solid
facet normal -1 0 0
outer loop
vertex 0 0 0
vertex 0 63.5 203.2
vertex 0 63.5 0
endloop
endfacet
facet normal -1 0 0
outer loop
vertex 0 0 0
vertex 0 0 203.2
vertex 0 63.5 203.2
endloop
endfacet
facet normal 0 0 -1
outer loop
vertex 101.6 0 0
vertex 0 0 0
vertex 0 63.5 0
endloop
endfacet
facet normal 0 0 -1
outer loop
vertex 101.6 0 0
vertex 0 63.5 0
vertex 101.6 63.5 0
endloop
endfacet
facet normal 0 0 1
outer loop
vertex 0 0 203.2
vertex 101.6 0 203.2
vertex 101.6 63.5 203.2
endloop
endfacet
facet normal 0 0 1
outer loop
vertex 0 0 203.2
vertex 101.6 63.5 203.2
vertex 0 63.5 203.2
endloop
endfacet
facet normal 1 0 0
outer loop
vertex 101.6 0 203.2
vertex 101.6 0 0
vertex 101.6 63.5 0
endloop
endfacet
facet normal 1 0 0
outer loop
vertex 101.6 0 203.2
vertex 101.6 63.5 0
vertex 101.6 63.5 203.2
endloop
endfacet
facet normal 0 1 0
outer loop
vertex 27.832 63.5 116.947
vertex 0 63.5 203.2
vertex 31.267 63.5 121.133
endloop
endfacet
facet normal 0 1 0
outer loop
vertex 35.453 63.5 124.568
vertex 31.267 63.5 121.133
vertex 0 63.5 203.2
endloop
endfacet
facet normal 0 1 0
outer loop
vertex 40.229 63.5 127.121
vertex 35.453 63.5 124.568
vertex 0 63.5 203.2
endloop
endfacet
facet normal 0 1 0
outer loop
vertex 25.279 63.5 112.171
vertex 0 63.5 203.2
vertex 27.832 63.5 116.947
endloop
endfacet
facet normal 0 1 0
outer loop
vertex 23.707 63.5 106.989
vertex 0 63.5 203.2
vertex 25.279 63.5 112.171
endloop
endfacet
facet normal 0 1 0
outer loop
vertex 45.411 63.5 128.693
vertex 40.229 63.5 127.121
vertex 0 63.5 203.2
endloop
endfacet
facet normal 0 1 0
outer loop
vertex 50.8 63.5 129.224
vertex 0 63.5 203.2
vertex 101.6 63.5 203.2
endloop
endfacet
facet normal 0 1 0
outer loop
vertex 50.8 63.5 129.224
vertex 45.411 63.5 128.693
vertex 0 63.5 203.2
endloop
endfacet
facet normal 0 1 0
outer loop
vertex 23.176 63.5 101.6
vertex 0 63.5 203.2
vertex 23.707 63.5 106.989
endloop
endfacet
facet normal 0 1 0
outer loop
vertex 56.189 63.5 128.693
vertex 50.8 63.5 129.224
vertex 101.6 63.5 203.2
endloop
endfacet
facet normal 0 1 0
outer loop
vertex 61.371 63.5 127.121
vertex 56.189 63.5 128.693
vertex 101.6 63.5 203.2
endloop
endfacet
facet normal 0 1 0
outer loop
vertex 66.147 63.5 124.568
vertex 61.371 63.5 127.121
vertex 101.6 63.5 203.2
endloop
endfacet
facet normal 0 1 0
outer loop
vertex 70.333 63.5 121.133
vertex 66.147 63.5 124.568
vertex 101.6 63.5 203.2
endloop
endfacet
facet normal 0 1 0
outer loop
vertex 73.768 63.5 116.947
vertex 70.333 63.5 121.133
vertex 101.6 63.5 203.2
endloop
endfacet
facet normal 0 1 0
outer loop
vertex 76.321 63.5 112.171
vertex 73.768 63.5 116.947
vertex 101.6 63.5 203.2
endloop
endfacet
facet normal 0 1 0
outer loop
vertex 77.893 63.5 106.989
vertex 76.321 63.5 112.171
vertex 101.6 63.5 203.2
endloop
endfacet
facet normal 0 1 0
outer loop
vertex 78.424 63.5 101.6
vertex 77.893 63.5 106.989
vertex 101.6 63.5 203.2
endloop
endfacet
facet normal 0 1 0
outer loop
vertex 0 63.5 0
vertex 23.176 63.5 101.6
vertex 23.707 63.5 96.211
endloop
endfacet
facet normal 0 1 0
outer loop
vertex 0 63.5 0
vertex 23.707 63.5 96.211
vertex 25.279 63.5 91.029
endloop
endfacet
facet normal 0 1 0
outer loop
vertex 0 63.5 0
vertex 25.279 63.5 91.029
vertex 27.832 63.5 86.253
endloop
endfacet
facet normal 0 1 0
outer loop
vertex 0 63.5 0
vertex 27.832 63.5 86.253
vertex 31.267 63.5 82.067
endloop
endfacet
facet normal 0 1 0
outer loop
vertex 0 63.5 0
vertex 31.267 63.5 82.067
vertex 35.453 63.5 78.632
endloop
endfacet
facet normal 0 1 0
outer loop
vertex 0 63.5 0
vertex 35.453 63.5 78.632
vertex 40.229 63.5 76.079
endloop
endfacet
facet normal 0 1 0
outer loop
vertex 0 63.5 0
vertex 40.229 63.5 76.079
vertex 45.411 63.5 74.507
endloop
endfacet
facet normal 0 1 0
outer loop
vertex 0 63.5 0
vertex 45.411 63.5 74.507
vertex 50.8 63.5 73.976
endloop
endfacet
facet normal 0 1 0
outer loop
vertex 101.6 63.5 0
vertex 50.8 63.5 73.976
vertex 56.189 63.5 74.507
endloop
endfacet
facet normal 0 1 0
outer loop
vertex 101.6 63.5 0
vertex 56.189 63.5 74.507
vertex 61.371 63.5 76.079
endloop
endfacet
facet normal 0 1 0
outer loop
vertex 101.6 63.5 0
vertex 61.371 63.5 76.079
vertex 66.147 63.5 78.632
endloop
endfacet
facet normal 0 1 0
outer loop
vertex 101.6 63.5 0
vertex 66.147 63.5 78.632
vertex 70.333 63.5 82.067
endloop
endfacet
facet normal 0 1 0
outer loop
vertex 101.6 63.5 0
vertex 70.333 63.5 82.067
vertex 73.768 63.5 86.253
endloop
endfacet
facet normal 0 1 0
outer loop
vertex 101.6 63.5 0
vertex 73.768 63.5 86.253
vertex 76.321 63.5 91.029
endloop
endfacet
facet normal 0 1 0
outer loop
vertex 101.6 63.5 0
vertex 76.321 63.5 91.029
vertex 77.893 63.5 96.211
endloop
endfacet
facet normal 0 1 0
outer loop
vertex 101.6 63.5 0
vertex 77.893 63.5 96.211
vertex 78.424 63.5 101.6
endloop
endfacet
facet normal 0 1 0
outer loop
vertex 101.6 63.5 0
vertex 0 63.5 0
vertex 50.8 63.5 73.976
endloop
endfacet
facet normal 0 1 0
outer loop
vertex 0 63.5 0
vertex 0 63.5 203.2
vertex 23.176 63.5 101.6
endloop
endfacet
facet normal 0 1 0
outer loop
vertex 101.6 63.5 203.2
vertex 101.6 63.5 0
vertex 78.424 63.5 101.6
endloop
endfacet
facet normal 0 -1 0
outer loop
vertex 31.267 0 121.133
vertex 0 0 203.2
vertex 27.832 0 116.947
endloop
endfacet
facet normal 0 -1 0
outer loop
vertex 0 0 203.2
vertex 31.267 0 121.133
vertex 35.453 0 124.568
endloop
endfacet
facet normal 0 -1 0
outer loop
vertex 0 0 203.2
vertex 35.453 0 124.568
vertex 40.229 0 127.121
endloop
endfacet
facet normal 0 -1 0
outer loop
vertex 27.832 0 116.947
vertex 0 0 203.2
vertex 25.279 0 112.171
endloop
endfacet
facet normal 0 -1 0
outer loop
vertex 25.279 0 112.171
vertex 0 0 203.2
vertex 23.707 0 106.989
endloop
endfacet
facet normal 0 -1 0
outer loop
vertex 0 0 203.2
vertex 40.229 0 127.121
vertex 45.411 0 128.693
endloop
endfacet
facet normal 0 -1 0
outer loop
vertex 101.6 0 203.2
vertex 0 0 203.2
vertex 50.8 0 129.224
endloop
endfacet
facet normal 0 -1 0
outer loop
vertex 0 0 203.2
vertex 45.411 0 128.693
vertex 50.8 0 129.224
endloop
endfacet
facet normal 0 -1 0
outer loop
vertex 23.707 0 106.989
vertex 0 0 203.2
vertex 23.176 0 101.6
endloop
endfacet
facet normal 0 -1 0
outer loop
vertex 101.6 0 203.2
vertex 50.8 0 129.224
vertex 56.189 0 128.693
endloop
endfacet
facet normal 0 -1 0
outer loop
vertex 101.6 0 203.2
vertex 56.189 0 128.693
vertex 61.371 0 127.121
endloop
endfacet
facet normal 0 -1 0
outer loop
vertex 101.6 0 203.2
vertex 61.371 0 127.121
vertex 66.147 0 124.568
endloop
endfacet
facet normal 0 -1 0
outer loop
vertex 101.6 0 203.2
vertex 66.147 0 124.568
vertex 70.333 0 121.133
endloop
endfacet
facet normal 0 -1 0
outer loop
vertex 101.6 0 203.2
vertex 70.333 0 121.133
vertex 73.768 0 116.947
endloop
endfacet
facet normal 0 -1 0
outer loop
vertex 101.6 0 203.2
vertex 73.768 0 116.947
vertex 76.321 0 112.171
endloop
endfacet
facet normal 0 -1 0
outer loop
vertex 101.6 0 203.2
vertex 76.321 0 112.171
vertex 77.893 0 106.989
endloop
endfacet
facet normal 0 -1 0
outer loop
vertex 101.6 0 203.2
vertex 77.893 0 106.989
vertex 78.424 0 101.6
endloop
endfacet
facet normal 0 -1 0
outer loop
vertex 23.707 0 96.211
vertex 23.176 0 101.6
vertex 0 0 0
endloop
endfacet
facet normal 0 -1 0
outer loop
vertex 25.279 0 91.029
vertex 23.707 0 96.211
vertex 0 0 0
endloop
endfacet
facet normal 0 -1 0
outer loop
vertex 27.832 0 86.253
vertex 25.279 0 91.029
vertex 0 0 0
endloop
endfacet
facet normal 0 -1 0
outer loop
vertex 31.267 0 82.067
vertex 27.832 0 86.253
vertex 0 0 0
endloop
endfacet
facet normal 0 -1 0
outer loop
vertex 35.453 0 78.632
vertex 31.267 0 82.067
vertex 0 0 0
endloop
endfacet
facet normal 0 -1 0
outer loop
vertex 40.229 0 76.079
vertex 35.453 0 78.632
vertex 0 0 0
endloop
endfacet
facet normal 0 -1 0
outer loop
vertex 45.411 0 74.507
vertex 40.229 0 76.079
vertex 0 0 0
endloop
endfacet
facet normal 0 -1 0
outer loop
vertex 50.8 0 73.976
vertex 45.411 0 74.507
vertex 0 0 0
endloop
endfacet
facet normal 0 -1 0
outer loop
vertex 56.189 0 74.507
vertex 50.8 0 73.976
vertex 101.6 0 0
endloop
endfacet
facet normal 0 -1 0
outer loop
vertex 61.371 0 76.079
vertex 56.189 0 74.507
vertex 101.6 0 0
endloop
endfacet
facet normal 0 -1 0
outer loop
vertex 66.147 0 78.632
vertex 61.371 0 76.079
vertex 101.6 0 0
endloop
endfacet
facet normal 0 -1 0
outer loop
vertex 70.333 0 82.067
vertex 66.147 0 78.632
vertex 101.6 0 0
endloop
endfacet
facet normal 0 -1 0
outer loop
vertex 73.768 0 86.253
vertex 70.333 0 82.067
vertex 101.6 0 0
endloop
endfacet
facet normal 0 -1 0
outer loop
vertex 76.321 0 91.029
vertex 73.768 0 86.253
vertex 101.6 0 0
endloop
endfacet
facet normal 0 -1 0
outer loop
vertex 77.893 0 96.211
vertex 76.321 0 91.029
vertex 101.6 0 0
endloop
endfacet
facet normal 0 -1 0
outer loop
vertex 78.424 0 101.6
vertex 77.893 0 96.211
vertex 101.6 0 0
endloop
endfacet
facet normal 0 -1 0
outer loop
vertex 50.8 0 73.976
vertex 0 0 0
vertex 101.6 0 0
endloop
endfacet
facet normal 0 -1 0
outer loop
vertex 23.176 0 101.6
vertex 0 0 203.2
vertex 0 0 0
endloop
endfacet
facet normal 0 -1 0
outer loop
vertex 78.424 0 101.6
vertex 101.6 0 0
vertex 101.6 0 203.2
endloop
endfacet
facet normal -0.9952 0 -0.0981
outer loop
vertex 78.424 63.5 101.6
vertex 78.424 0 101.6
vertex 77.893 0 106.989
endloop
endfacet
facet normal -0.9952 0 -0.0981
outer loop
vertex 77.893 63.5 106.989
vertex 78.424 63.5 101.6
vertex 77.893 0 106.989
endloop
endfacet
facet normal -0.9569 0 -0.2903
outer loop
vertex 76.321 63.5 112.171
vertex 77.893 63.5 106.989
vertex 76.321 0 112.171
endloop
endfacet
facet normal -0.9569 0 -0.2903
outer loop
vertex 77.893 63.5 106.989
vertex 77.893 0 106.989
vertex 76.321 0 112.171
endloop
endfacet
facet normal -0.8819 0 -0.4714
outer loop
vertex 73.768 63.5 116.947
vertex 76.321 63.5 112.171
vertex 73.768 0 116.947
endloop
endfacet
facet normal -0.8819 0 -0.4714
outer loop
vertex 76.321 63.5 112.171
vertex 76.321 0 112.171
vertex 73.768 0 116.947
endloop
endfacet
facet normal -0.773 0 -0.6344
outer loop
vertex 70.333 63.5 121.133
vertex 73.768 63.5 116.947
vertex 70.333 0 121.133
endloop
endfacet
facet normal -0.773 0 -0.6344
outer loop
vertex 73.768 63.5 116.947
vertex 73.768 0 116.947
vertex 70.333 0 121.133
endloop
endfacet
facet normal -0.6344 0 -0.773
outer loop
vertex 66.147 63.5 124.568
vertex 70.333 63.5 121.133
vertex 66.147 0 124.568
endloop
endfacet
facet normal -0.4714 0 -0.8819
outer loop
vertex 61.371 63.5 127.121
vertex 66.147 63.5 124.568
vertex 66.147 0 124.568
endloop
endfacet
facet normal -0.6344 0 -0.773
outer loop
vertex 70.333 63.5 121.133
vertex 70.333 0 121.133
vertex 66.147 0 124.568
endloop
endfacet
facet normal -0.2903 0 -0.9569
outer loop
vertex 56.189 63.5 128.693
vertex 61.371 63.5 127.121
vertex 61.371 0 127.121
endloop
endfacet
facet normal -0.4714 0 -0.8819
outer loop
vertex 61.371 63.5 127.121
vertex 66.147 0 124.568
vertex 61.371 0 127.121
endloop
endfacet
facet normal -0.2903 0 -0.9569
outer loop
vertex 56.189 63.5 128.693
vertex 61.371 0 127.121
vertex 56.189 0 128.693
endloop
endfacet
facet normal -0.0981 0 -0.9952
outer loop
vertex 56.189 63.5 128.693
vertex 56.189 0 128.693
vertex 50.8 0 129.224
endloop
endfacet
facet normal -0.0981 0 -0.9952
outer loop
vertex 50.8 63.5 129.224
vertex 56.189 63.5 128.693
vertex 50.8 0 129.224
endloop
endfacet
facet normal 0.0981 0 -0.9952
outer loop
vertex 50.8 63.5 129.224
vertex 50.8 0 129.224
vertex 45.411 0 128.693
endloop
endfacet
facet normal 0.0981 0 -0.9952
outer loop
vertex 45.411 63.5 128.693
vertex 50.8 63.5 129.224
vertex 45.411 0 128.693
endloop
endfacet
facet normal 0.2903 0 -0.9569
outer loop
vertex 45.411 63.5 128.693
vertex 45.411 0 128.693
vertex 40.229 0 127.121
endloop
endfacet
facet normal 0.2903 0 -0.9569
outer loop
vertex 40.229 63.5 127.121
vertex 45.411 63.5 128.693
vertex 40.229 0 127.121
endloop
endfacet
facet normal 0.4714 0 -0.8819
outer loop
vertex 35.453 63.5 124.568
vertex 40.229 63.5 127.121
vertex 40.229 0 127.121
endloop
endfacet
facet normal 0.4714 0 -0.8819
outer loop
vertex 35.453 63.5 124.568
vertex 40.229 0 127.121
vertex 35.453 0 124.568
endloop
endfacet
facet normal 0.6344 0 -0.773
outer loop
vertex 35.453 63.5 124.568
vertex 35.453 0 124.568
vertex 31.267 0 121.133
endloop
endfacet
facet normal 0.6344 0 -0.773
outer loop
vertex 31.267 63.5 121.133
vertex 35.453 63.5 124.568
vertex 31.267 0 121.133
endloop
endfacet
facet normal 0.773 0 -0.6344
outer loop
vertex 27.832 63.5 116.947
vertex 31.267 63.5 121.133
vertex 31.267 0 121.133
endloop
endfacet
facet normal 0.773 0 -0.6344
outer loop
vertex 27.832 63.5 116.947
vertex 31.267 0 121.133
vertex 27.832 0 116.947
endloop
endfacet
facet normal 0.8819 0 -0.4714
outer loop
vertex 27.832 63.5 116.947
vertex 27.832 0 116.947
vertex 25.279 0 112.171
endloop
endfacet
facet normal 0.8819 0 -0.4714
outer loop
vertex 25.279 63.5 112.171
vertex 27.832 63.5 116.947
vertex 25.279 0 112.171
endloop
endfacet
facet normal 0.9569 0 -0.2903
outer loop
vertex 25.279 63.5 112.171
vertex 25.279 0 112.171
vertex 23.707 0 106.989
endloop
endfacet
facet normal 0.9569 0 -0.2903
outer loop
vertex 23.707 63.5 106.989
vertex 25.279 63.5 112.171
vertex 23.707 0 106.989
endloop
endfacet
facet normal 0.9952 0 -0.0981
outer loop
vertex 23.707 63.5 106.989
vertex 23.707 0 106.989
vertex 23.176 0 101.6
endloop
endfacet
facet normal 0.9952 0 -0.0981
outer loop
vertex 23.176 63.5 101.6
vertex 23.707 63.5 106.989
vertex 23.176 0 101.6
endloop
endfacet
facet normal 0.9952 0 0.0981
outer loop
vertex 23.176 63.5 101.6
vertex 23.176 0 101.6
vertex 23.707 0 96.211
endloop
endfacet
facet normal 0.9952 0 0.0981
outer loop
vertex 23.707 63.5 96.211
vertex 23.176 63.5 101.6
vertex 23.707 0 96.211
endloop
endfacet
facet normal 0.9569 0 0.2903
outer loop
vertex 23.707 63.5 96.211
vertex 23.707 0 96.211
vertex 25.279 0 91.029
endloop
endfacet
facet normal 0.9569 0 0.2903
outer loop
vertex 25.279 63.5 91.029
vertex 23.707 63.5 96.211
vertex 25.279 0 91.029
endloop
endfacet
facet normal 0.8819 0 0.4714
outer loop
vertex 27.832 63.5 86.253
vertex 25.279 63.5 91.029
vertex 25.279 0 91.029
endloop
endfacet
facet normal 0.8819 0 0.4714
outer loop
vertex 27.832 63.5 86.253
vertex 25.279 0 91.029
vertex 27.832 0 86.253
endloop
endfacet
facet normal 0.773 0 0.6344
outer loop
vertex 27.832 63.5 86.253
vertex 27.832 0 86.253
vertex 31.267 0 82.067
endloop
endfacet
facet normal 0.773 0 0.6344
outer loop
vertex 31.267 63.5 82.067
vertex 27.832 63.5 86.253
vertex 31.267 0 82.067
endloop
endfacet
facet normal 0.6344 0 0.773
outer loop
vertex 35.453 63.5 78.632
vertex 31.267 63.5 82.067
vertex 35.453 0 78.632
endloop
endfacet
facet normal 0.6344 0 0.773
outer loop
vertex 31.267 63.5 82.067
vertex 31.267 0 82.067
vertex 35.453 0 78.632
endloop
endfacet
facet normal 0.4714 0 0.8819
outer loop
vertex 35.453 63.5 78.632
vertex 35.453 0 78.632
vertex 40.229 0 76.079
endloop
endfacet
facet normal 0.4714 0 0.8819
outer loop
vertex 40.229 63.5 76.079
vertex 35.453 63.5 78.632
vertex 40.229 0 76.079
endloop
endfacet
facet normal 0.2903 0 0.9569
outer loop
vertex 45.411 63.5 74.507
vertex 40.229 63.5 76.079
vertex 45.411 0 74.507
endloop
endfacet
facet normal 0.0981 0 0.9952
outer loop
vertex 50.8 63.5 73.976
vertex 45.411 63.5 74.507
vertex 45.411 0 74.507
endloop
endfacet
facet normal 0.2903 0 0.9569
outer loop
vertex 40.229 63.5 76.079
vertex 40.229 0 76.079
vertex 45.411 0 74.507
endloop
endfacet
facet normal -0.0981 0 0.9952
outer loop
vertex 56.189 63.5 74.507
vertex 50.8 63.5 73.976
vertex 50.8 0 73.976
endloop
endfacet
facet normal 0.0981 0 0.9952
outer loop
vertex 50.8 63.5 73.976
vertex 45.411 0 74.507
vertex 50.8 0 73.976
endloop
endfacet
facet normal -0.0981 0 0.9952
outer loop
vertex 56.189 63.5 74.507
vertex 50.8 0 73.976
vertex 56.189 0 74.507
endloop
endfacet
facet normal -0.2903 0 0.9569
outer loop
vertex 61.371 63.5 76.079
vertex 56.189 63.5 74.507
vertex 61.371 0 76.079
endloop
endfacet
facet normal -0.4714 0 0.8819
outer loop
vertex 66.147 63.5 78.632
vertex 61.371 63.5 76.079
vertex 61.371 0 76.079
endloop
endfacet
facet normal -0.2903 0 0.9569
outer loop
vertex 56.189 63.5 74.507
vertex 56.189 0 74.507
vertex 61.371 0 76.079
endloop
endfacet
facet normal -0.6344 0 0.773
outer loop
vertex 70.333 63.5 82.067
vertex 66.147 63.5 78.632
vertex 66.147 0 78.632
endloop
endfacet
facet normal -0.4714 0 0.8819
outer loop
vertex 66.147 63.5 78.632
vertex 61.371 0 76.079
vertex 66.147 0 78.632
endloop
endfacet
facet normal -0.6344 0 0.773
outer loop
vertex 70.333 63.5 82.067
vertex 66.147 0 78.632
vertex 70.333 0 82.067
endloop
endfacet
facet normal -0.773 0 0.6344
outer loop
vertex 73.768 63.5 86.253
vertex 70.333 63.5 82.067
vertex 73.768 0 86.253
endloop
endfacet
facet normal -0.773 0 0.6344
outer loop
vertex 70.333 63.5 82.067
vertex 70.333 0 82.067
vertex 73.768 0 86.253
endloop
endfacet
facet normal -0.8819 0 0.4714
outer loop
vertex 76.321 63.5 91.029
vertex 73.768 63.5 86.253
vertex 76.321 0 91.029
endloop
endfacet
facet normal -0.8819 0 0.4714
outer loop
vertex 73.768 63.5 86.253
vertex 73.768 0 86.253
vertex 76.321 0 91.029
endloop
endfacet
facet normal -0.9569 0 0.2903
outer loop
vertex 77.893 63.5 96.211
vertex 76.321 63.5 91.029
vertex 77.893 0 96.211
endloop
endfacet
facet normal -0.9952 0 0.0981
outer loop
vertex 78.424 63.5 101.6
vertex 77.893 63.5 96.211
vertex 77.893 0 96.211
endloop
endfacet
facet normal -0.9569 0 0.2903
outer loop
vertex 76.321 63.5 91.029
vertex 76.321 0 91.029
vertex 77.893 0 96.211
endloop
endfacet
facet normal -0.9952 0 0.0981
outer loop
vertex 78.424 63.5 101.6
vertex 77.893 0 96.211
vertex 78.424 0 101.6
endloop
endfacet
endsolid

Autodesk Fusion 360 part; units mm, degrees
sketch "Sketch1" plane through (0, 0, 0) normal (0, 1, 0) x (1, 0, 0) in component "Nut_template"
  line L0 (0, 0) -> (101.6, 0)
  line L1 (101.6, 0) -> (101.6, -203.2)
  line L2 (101.6, -203.2) -> (0, -203.2)
  line L3 (0, -203.2) -> (0, 0)
  circle A0 centre (50.8, -101.6) radius 31.75
  line L4 (0, -203.2) -> (101.6, 0) construction
  line L5 (0, 0) -> (101.6, -203.2) construction
  point P0 (50.8, -101.6)
  dimension "d38" = 101.6
  dimension "d39" = 203.2
  dimension "d40" = 63.5
extrude "Extrude1" add sketch "Sketch1" along normal blind 63.5 in component "Nut_template"
thread "Thread1" "ACME Screw Threads 2 1/2 2.5000 4G" major diameter 64.262 minor diameter 55.2475 pitch 8.4667 angle 29 resizes the face on face at (82.5105, 42.3333, 103.1826) in component "Nut_template"
component "Nut_template" placed x (1, 0, 0) y (0, 1, 0) z (0, 0, 1) at (0, 0, 0)
equation "d38 = nut_width"
equation "d39 = nut_length"
equation "d40 = screw_diameter"
equation "d41 = nut_thickness"
equation "screw_diameter = 2.5 in"
equation "nut_thickness = 2.5 in"
equation "nut_length = 8 in"
equation "nut_width = 4 in"
equation "height_Ref = 34 in"
equation "length_Ref = 84 in"
equation "width_Ref = 24 in"
equation "cabinet_thickness_Ref = 0.75 in"
equation "chamfer_large_Ref = 0.5 in"
equation "chamfer_medium_Ref = 0.25 in"
equation "chamfer_small_Ref = 0.125 in"
equation "dogHole_length_Ref = 1 in"
equation "dogHole_setback_Ref = 1.75 in"
equation "dogHole_spacing_Ref = 4 in"
equation "dogHole_width_Ref = 0.75 in"
equation "dovetail_angle_Ref = 18 deg"
equation "leg_angle_Ref = 10 deg"
equation "leg_shoulderWidth_Ref = 0.25 in"
equation "leg_thickness_Ref = 4 in"
equation "leg_width_Ref = 5 in"
equation "panelGroove_width_Ref = 0.25 in"
equation "screw_diameter_Ref = 2.5 in"
equation "shoulder_width_Ref = 0.5 in"
equation "stretcher_thickness_Ref = 2 in"
equation "stretcher_width_Ref = 4 in"
equation "tenon_length_Ref = 1.5 in"
equation "top_leftOverhang_Ref = 6 in"
equation "top_rightOverhang_Ref = 20 in"
equation "top_thickness_Ref = 4 in"
equation "wagonVise_topThickness_Ref = 1 in"
equation "dog_headHeight_Ref = 1 in"
equation "lvScrew_height_Ref = 22 in"
equation "lvGuide_width_Ref = 3 in"
equation "lvGuide_thickness_Ref = 1 in"
equation "lvGuide_height_Ref = 6 in"
equation "nut_thickness_Ref = 2 in"
equation "nut_length_Ref = 8 in"
equation "nut_width_Ref = 4 in"
equation "garter_thickness_Ref = 0.25 in"
equation "handle_diameter_Ref = 1 in"
equation "garter_width_Ref = 4 in"
equation "lvPin_diameter_Ref = 0.5 in"
equation "endCap_thickness_Ref = 2.5 in"
equation "screw_length_Ref = 24 in"
equation "screw_hubLength_Ref = 4 in"
